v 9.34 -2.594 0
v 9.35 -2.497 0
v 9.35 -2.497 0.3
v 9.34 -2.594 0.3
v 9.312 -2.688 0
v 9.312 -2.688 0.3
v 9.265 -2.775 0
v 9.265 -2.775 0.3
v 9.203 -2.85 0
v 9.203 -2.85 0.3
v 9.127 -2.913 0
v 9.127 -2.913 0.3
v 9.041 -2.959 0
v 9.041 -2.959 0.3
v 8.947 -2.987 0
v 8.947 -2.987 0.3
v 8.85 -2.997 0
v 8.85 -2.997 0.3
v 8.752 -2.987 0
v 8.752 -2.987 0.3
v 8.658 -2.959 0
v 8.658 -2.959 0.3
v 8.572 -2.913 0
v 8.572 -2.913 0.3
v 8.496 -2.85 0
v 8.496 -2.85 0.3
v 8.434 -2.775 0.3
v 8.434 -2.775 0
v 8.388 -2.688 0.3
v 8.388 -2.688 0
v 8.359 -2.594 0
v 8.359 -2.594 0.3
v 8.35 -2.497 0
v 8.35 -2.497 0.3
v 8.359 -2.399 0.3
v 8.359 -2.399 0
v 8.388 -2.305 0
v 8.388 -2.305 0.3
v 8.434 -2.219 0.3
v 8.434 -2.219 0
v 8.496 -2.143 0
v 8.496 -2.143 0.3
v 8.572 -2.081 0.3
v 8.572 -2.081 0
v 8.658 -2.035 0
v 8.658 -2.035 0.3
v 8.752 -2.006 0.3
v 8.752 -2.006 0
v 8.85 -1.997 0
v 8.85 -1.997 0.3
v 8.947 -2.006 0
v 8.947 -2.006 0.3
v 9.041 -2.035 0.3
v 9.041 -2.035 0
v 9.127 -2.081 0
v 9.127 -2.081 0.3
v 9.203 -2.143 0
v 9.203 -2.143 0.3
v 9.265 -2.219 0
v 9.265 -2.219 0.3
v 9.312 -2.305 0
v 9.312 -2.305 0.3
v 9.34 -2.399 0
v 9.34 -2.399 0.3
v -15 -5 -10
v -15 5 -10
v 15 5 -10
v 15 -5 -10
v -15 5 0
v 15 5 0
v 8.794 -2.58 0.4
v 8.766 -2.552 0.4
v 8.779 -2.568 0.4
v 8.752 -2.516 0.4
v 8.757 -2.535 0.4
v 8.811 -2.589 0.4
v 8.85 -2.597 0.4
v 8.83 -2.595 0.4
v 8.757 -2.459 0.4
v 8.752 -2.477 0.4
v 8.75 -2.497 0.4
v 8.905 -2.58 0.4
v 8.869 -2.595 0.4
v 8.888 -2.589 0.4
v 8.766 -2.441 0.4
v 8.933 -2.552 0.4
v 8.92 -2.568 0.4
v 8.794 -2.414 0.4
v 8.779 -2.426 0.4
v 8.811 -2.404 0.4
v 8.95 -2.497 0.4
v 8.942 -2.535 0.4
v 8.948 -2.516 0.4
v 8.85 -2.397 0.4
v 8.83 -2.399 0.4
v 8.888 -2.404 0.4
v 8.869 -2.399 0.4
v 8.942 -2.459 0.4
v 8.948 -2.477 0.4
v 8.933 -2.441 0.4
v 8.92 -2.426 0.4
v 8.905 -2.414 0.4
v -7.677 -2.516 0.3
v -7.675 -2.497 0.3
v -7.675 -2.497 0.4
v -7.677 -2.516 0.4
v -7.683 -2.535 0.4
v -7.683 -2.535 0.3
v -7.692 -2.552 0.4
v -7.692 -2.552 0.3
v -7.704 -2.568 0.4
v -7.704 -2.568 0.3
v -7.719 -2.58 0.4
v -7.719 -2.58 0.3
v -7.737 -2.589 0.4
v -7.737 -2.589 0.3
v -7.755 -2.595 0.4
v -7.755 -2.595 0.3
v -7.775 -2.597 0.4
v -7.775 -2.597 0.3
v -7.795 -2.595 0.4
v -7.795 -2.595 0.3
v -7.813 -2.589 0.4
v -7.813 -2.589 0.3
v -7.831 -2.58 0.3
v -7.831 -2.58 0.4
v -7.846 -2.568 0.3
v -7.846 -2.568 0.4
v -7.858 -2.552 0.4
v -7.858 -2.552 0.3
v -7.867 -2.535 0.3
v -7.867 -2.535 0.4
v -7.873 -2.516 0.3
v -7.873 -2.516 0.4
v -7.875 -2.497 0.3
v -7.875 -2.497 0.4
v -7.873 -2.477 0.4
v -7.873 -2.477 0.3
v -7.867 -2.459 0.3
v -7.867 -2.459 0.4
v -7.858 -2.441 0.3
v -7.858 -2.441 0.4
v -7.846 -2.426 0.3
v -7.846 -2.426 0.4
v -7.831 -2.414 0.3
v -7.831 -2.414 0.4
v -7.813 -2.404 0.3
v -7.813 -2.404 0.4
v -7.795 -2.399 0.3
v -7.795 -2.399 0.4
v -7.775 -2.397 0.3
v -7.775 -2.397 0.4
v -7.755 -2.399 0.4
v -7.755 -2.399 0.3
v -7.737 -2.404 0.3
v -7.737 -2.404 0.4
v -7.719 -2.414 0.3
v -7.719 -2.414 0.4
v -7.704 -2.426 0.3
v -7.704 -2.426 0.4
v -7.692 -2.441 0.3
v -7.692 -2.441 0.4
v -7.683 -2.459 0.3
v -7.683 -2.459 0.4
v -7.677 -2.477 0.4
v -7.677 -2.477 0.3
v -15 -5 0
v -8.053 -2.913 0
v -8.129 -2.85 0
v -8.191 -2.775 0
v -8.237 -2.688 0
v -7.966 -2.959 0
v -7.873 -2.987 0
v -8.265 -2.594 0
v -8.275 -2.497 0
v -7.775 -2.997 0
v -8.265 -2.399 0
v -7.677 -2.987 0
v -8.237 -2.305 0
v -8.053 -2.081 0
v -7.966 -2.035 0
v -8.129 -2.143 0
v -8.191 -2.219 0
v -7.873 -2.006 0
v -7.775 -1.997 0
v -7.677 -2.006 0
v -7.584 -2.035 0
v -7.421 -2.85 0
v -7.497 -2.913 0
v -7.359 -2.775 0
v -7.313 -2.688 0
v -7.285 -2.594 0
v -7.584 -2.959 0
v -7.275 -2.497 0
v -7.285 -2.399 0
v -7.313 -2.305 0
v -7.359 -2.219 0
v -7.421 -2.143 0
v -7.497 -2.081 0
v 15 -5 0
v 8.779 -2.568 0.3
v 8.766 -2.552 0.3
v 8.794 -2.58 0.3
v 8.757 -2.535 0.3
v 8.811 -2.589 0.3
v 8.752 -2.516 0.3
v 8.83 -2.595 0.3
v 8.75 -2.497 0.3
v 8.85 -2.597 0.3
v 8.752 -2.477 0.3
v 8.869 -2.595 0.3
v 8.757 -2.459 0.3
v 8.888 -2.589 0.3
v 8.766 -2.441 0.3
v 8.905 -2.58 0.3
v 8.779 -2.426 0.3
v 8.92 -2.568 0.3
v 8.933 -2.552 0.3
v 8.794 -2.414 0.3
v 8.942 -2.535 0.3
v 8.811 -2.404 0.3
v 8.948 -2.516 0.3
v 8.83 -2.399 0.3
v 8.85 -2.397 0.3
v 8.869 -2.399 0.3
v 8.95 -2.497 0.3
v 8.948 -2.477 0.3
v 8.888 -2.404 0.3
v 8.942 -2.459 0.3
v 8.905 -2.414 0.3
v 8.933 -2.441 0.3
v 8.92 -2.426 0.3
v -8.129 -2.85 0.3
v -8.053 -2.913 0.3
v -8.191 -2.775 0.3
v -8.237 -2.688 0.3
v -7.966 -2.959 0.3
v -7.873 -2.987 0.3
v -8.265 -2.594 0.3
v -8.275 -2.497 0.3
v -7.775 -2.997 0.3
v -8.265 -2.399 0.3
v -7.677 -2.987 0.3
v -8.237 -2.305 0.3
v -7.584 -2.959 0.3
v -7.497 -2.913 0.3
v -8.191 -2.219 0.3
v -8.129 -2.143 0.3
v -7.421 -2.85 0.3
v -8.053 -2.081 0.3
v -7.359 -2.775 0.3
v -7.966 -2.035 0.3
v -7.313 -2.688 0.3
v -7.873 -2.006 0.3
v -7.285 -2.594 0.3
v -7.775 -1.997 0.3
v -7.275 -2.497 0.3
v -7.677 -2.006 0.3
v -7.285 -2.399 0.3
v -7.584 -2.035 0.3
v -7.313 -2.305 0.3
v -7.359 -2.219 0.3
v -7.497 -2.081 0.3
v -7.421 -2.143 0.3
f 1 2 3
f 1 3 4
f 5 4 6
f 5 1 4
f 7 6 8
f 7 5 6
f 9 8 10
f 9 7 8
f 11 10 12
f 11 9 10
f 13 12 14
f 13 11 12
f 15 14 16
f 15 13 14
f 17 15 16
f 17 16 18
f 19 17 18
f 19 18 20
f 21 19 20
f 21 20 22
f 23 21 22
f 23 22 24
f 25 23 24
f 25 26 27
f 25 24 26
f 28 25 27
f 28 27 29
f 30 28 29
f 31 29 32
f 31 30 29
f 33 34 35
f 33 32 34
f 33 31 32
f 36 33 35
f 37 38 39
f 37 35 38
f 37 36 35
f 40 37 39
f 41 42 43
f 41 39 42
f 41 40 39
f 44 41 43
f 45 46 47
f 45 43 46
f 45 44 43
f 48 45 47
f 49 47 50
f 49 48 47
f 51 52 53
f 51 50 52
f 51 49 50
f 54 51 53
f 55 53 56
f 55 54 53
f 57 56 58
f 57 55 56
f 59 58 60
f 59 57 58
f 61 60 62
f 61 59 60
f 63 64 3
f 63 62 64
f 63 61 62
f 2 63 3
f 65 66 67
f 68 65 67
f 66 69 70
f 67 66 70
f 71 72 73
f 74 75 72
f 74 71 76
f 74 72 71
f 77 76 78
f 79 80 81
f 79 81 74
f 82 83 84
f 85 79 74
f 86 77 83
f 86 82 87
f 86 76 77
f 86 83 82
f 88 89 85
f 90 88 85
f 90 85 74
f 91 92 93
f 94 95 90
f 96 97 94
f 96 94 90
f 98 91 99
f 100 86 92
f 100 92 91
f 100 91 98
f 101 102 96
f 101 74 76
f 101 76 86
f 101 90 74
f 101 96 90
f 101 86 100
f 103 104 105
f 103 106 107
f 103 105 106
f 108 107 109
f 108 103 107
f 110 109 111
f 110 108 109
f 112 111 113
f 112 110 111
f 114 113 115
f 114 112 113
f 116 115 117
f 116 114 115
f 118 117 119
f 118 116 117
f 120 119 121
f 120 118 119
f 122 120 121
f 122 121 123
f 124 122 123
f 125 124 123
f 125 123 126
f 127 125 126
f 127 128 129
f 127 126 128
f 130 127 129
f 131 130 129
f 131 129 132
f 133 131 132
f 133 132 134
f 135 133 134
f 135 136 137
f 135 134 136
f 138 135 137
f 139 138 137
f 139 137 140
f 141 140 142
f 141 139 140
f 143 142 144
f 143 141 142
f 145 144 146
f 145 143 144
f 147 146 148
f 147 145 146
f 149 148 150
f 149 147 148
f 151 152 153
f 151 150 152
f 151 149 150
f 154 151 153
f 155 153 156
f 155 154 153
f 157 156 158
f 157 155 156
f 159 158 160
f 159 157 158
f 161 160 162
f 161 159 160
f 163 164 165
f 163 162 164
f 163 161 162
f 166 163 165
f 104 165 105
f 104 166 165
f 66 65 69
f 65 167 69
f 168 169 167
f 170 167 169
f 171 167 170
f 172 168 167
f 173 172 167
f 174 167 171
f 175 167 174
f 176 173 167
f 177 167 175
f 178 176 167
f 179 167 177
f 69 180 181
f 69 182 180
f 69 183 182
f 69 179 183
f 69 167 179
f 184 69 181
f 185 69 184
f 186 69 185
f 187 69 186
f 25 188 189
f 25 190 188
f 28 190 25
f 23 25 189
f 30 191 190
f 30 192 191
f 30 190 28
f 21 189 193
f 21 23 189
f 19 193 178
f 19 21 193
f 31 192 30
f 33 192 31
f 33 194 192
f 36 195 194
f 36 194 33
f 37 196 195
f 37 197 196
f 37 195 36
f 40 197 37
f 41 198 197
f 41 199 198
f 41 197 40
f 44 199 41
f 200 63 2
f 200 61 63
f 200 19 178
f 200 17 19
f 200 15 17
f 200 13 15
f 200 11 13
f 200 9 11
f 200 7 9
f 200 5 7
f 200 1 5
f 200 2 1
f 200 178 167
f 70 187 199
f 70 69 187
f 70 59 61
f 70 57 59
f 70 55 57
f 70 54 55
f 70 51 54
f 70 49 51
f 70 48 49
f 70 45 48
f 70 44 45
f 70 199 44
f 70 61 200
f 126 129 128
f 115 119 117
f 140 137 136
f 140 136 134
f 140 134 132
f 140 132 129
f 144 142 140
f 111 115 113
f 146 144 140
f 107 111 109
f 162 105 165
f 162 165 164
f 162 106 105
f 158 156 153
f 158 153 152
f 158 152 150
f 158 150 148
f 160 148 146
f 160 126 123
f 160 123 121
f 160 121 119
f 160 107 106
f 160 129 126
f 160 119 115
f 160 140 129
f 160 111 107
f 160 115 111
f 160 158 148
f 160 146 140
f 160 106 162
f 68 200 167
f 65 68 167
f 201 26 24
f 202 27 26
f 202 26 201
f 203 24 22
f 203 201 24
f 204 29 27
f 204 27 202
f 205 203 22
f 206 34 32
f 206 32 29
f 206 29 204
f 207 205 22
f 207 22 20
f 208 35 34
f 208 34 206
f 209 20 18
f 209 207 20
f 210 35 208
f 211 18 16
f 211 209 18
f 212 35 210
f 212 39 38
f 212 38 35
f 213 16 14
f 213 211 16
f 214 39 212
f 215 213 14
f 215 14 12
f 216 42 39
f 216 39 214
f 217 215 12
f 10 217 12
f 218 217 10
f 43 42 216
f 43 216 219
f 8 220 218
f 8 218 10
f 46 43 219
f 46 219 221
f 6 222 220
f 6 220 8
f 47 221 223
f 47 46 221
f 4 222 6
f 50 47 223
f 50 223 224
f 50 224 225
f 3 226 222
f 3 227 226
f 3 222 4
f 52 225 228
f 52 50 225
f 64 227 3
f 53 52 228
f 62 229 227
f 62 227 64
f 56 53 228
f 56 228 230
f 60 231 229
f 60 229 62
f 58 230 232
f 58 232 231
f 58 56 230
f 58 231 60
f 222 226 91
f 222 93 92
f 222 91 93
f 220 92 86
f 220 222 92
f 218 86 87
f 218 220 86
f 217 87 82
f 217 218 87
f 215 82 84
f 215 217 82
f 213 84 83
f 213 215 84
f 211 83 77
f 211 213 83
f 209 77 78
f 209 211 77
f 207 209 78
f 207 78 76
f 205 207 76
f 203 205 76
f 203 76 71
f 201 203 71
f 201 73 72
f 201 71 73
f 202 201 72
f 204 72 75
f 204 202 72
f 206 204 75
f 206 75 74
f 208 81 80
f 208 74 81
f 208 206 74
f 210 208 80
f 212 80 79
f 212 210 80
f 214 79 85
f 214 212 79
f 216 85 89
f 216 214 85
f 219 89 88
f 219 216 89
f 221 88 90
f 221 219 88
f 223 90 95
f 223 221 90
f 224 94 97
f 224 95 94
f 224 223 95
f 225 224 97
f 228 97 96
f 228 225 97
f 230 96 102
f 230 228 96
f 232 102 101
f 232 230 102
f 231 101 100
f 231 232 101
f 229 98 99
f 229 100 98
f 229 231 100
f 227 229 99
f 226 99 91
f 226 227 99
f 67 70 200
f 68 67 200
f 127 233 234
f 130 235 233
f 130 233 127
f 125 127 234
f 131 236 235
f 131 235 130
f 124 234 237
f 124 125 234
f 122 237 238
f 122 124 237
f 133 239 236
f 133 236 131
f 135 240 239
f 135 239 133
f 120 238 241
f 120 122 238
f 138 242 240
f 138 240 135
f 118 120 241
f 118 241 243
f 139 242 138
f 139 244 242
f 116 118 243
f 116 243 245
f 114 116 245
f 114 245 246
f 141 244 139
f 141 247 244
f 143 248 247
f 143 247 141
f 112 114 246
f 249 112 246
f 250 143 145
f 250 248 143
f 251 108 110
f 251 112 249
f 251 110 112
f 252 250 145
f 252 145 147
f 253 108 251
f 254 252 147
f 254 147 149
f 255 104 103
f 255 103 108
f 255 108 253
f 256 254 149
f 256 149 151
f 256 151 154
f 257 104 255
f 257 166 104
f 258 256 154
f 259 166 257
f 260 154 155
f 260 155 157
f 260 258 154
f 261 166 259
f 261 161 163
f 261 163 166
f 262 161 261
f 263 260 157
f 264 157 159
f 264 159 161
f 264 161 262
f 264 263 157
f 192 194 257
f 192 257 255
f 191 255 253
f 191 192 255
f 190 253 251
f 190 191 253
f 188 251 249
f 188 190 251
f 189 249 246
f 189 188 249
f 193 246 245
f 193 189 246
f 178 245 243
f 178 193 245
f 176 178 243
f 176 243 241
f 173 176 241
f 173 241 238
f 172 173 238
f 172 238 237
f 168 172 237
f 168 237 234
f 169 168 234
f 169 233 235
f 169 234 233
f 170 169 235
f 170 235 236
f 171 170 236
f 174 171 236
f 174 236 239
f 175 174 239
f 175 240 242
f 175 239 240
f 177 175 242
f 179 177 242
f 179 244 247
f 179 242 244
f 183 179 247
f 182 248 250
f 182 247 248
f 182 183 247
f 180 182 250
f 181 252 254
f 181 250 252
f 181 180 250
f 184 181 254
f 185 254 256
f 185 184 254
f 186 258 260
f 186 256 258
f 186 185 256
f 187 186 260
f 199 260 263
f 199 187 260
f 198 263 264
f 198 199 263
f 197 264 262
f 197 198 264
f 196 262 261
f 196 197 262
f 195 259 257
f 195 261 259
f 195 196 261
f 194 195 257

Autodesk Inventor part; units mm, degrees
ref_plane "YZ Plane" through (0, 0, 0) normal (1, 0, 0) x (0, 1, 0)
ref_plane "XZ Plane" through (0, 0, 0) normal (0, 1, 0) x (-1, 0, 0)
sketch "Эскиз1" plane through (0, 0, 0) normal (0, 0, 1) x (1, 0, 0)
  line L0 (-15, 5) -> (15, 5)
  line L1 (15, 5) -> (15, -5)
  line L2 (15, -5) -> (-15, -5)
  line L3 (-15, -5) -> (-15, 5)
  point P0 (0, 0)
  point P1 (0, 5)
  point P2 (15, 0)
  dimension "d0" = 30
  dimension "d1" = 10
extrude "Выдавливание1" add sketch "Эскиз1" against normal blind 10
sketch "Эскиз2" plane through (0, 0, 0) normal (0, 0, 1) x (1, 0, 0)
  line L0 (-7.5853, 4.0771) -> (10.7261, 4.0771) construction
  line L1 (10.7261, 4.0771) -> (10.7261, -0.5016) construction
  line L2 (10.7261, -0.5016) -> (-7.5853, -0.5016) construction
  line L3 (-7.5853, -0.5016) -> (-7.5853, 4.0771) construction
  point P0 (0, 0)
ref_plane "РабПлоскость1" through (0, 0, 0) normal (0, 0, 1) x (1, 0, 0)
sketch "Эскиз3" plane through (0, 0, 0) normal (0, 0, 1) x (1, 0, 0)
  circle A0 centre (-7.775, -2.4968) radius 0.5
  circle A1 centre (8.8496, -2.4968) radius 0.5
  point P0 (0, 0)
  dimension "d5" = 1
  dimension "d6" = 1
extrude "Выдавливание2" add sketch "Эскиз3" along normal blind 0.3
sketch "Эскиз4" plane through (0, 0, 0) normal (0, 0, 1) x (1, 0, 0)
  circle A0 centre (-7.775, -2.4968) radius 0.5 projected
  circle A1 centre (-7.775, -2.4968) radius 0.1
  circle A2 centre (8.8496, -2.4968) radius 0.5 projected
  circle A3 centre (8.8496, -2.4968) radius 0.1
  point P0 (0, 0)
  dimension "d9" = 0.2
  dimension "d10" = 0.2
extrude "Выдавливание3" add sketch "Эскиз4" along normal blind 0.4 contours A1 | A3
properties part number "lock-in"
